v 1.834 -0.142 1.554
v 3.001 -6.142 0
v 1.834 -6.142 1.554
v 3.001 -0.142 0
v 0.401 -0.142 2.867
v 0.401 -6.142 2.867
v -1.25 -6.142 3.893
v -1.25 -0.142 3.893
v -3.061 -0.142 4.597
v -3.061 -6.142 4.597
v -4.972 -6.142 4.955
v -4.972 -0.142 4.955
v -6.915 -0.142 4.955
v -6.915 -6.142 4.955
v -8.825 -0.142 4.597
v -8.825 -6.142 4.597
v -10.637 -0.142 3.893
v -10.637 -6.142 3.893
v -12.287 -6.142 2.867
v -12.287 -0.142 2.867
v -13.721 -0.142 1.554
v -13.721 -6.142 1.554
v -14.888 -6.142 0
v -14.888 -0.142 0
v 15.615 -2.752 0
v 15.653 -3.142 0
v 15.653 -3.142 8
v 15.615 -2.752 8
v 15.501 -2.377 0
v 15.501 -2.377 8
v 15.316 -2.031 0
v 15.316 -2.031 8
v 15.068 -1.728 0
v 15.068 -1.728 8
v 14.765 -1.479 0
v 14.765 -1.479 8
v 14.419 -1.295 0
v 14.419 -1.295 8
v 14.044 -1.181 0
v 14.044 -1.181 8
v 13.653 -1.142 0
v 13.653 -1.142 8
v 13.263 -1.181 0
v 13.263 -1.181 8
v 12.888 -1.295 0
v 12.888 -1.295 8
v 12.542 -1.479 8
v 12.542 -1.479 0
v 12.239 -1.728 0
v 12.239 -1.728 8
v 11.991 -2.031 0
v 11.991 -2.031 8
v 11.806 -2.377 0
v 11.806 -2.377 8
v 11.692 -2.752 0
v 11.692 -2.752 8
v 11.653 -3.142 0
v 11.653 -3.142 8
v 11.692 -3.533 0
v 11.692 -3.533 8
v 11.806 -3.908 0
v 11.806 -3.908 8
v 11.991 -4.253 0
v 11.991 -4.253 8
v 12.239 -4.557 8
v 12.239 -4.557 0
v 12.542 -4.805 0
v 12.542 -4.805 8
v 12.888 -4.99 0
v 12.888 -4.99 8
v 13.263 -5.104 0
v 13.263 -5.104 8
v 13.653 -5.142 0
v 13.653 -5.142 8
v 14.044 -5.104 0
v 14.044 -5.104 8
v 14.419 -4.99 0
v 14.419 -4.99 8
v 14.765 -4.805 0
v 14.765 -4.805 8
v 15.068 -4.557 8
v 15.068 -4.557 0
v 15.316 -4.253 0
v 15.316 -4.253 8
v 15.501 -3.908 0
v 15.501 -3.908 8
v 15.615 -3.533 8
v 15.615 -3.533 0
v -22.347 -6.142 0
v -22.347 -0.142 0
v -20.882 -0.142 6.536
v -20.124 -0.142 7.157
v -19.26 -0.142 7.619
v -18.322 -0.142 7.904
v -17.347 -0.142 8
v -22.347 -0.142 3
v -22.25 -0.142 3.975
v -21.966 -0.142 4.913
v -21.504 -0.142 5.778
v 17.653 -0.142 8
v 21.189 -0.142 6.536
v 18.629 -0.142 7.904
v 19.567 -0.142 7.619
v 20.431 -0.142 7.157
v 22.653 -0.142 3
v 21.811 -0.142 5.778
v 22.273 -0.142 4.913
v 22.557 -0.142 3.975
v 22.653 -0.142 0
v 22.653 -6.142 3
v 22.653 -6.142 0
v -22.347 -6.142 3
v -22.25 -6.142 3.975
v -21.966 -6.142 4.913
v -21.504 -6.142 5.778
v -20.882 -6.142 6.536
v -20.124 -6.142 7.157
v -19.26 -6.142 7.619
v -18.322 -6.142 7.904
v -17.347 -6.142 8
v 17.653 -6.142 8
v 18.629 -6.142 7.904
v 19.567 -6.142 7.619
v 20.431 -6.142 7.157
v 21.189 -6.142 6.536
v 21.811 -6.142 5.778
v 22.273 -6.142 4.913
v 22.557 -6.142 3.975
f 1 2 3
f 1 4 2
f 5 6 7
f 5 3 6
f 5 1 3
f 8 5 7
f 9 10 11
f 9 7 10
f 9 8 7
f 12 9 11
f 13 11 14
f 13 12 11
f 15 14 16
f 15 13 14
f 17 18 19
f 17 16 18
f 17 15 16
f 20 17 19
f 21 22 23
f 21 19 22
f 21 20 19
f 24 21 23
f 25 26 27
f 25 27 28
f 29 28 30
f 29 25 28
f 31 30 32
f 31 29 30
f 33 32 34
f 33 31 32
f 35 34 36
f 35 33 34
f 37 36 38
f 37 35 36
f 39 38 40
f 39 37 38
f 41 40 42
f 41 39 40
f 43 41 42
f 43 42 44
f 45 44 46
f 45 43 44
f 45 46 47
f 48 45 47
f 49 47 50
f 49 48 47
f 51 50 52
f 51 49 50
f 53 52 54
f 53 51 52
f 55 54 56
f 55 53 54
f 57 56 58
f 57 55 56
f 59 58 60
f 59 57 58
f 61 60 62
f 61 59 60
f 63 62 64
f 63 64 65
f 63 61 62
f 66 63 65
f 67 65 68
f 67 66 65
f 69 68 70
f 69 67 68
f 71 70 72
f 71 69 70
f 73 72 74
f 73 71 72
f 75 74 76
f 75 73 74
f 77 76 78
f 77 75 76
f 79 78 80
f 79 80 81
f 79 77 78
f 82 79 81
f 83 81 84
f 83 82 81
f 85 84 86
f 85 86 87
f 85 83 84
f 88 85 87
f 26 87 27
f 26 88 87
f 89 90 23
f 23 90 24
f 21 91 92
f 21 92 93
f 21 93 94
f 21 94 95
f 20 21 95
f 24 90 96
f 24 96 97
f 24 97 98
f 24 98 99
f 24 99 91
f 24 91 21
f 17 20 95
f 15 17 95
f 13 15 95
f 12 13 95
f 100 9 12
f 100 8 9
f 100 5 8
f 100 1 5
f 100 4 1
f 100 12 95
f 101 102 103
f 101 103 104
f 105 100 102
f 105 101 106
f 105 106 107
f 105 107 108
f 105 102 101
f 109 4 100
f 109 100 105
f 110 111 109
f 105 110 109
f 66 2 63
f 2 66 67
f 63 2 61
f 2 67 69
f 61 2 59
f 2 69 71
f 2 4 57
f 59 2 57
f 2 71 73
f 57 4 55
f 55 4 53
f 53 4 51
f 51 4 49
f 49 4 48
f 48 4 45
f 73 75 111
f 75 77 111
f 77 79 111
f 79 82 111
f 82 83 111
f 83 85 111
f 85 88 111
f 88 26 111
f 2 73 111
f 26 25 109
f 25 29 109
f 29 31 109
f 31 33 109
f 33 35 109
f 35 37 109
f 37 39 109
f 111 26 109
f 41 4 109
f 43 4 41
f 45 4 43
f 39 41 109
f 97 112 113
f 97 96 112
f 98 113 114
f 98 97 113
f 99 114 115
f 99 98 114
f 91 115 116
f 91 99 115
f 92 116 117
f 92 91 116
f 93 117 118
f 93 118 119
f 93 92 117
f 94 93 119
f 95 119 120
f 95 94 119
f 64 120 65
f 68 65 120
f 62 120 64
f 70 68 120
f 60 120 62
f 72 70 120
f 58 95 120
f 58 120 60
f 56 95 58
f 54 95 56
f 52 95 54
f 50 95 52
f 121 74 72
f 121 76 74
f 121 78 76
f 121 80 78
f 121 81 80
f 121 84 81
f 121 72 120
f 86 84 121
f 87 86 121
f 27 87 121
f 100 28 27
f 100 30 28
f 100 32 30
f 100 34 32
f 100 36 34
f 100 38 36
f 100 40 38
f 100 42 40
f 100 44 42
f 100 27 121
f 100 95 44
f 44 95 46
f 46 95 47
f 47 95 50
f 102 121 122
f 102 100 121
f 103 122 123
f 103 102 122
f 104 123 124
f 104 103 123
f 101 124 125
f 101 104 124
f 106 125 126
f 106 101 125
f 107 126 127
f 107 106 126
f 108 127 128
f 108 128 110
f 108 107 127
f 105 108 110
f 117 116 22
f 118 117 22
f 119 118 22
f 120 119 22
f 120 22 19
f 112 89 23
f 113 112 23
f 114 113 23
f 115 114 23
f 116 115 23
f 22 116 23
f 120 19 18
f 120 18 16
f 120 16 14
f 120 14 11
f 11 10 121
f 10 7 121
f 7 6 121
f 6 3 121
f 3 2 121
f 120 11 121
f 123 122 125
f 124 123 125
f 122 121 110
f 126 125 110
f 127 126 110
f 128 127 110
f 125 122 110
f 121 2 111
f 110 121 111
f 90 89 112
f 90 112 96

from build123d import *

# Parameters (mm, degrees)
F0_W     = 45
F0_H     = 6
F0_R     = 2
F1_DEPTH = 8
F2_R     = 10.5
F3_DEPTH = 8
F4_R     = 5
F5_R     = 5


with BuildPart() as f1:
    # F0 (on Top) → F1 (new body)
    with BuildSketch(Plane.XY):
        with Locations((0.153442, -3.142335)):
            Rectangle(F0_W, F0_H)
        with Locations((13.653442, -3.142335)):
            Circle(F0_R, mode=Mode.SUBTRACT)
    extrude(amount=F1_DEPTH)

    # F2 (on Front) → F3 (cut)
    with BuildSketch(Plane.XZ):
        with Locations((-5.943397, -5.5)):
            Circle(F2_R)
    extrude(amount=F3_DEPTH, mode=Mode.SUBTRACT)

    # F4
    f4_edges = [f1.edges().sort_by_distance(p)[0] for p in [
        (-22.346558, -3.142335, 8),
    ]]
    fillet(f4_edges, radius=F4_R)

    # F5
    f5_edges = [f1.edges().sort_by_distance(p)[0] for p in [
        (22.653442, -3.142335, 8),
    ]]
    fillet(f5_edges, radius=F5_R)


solid = f1.part
